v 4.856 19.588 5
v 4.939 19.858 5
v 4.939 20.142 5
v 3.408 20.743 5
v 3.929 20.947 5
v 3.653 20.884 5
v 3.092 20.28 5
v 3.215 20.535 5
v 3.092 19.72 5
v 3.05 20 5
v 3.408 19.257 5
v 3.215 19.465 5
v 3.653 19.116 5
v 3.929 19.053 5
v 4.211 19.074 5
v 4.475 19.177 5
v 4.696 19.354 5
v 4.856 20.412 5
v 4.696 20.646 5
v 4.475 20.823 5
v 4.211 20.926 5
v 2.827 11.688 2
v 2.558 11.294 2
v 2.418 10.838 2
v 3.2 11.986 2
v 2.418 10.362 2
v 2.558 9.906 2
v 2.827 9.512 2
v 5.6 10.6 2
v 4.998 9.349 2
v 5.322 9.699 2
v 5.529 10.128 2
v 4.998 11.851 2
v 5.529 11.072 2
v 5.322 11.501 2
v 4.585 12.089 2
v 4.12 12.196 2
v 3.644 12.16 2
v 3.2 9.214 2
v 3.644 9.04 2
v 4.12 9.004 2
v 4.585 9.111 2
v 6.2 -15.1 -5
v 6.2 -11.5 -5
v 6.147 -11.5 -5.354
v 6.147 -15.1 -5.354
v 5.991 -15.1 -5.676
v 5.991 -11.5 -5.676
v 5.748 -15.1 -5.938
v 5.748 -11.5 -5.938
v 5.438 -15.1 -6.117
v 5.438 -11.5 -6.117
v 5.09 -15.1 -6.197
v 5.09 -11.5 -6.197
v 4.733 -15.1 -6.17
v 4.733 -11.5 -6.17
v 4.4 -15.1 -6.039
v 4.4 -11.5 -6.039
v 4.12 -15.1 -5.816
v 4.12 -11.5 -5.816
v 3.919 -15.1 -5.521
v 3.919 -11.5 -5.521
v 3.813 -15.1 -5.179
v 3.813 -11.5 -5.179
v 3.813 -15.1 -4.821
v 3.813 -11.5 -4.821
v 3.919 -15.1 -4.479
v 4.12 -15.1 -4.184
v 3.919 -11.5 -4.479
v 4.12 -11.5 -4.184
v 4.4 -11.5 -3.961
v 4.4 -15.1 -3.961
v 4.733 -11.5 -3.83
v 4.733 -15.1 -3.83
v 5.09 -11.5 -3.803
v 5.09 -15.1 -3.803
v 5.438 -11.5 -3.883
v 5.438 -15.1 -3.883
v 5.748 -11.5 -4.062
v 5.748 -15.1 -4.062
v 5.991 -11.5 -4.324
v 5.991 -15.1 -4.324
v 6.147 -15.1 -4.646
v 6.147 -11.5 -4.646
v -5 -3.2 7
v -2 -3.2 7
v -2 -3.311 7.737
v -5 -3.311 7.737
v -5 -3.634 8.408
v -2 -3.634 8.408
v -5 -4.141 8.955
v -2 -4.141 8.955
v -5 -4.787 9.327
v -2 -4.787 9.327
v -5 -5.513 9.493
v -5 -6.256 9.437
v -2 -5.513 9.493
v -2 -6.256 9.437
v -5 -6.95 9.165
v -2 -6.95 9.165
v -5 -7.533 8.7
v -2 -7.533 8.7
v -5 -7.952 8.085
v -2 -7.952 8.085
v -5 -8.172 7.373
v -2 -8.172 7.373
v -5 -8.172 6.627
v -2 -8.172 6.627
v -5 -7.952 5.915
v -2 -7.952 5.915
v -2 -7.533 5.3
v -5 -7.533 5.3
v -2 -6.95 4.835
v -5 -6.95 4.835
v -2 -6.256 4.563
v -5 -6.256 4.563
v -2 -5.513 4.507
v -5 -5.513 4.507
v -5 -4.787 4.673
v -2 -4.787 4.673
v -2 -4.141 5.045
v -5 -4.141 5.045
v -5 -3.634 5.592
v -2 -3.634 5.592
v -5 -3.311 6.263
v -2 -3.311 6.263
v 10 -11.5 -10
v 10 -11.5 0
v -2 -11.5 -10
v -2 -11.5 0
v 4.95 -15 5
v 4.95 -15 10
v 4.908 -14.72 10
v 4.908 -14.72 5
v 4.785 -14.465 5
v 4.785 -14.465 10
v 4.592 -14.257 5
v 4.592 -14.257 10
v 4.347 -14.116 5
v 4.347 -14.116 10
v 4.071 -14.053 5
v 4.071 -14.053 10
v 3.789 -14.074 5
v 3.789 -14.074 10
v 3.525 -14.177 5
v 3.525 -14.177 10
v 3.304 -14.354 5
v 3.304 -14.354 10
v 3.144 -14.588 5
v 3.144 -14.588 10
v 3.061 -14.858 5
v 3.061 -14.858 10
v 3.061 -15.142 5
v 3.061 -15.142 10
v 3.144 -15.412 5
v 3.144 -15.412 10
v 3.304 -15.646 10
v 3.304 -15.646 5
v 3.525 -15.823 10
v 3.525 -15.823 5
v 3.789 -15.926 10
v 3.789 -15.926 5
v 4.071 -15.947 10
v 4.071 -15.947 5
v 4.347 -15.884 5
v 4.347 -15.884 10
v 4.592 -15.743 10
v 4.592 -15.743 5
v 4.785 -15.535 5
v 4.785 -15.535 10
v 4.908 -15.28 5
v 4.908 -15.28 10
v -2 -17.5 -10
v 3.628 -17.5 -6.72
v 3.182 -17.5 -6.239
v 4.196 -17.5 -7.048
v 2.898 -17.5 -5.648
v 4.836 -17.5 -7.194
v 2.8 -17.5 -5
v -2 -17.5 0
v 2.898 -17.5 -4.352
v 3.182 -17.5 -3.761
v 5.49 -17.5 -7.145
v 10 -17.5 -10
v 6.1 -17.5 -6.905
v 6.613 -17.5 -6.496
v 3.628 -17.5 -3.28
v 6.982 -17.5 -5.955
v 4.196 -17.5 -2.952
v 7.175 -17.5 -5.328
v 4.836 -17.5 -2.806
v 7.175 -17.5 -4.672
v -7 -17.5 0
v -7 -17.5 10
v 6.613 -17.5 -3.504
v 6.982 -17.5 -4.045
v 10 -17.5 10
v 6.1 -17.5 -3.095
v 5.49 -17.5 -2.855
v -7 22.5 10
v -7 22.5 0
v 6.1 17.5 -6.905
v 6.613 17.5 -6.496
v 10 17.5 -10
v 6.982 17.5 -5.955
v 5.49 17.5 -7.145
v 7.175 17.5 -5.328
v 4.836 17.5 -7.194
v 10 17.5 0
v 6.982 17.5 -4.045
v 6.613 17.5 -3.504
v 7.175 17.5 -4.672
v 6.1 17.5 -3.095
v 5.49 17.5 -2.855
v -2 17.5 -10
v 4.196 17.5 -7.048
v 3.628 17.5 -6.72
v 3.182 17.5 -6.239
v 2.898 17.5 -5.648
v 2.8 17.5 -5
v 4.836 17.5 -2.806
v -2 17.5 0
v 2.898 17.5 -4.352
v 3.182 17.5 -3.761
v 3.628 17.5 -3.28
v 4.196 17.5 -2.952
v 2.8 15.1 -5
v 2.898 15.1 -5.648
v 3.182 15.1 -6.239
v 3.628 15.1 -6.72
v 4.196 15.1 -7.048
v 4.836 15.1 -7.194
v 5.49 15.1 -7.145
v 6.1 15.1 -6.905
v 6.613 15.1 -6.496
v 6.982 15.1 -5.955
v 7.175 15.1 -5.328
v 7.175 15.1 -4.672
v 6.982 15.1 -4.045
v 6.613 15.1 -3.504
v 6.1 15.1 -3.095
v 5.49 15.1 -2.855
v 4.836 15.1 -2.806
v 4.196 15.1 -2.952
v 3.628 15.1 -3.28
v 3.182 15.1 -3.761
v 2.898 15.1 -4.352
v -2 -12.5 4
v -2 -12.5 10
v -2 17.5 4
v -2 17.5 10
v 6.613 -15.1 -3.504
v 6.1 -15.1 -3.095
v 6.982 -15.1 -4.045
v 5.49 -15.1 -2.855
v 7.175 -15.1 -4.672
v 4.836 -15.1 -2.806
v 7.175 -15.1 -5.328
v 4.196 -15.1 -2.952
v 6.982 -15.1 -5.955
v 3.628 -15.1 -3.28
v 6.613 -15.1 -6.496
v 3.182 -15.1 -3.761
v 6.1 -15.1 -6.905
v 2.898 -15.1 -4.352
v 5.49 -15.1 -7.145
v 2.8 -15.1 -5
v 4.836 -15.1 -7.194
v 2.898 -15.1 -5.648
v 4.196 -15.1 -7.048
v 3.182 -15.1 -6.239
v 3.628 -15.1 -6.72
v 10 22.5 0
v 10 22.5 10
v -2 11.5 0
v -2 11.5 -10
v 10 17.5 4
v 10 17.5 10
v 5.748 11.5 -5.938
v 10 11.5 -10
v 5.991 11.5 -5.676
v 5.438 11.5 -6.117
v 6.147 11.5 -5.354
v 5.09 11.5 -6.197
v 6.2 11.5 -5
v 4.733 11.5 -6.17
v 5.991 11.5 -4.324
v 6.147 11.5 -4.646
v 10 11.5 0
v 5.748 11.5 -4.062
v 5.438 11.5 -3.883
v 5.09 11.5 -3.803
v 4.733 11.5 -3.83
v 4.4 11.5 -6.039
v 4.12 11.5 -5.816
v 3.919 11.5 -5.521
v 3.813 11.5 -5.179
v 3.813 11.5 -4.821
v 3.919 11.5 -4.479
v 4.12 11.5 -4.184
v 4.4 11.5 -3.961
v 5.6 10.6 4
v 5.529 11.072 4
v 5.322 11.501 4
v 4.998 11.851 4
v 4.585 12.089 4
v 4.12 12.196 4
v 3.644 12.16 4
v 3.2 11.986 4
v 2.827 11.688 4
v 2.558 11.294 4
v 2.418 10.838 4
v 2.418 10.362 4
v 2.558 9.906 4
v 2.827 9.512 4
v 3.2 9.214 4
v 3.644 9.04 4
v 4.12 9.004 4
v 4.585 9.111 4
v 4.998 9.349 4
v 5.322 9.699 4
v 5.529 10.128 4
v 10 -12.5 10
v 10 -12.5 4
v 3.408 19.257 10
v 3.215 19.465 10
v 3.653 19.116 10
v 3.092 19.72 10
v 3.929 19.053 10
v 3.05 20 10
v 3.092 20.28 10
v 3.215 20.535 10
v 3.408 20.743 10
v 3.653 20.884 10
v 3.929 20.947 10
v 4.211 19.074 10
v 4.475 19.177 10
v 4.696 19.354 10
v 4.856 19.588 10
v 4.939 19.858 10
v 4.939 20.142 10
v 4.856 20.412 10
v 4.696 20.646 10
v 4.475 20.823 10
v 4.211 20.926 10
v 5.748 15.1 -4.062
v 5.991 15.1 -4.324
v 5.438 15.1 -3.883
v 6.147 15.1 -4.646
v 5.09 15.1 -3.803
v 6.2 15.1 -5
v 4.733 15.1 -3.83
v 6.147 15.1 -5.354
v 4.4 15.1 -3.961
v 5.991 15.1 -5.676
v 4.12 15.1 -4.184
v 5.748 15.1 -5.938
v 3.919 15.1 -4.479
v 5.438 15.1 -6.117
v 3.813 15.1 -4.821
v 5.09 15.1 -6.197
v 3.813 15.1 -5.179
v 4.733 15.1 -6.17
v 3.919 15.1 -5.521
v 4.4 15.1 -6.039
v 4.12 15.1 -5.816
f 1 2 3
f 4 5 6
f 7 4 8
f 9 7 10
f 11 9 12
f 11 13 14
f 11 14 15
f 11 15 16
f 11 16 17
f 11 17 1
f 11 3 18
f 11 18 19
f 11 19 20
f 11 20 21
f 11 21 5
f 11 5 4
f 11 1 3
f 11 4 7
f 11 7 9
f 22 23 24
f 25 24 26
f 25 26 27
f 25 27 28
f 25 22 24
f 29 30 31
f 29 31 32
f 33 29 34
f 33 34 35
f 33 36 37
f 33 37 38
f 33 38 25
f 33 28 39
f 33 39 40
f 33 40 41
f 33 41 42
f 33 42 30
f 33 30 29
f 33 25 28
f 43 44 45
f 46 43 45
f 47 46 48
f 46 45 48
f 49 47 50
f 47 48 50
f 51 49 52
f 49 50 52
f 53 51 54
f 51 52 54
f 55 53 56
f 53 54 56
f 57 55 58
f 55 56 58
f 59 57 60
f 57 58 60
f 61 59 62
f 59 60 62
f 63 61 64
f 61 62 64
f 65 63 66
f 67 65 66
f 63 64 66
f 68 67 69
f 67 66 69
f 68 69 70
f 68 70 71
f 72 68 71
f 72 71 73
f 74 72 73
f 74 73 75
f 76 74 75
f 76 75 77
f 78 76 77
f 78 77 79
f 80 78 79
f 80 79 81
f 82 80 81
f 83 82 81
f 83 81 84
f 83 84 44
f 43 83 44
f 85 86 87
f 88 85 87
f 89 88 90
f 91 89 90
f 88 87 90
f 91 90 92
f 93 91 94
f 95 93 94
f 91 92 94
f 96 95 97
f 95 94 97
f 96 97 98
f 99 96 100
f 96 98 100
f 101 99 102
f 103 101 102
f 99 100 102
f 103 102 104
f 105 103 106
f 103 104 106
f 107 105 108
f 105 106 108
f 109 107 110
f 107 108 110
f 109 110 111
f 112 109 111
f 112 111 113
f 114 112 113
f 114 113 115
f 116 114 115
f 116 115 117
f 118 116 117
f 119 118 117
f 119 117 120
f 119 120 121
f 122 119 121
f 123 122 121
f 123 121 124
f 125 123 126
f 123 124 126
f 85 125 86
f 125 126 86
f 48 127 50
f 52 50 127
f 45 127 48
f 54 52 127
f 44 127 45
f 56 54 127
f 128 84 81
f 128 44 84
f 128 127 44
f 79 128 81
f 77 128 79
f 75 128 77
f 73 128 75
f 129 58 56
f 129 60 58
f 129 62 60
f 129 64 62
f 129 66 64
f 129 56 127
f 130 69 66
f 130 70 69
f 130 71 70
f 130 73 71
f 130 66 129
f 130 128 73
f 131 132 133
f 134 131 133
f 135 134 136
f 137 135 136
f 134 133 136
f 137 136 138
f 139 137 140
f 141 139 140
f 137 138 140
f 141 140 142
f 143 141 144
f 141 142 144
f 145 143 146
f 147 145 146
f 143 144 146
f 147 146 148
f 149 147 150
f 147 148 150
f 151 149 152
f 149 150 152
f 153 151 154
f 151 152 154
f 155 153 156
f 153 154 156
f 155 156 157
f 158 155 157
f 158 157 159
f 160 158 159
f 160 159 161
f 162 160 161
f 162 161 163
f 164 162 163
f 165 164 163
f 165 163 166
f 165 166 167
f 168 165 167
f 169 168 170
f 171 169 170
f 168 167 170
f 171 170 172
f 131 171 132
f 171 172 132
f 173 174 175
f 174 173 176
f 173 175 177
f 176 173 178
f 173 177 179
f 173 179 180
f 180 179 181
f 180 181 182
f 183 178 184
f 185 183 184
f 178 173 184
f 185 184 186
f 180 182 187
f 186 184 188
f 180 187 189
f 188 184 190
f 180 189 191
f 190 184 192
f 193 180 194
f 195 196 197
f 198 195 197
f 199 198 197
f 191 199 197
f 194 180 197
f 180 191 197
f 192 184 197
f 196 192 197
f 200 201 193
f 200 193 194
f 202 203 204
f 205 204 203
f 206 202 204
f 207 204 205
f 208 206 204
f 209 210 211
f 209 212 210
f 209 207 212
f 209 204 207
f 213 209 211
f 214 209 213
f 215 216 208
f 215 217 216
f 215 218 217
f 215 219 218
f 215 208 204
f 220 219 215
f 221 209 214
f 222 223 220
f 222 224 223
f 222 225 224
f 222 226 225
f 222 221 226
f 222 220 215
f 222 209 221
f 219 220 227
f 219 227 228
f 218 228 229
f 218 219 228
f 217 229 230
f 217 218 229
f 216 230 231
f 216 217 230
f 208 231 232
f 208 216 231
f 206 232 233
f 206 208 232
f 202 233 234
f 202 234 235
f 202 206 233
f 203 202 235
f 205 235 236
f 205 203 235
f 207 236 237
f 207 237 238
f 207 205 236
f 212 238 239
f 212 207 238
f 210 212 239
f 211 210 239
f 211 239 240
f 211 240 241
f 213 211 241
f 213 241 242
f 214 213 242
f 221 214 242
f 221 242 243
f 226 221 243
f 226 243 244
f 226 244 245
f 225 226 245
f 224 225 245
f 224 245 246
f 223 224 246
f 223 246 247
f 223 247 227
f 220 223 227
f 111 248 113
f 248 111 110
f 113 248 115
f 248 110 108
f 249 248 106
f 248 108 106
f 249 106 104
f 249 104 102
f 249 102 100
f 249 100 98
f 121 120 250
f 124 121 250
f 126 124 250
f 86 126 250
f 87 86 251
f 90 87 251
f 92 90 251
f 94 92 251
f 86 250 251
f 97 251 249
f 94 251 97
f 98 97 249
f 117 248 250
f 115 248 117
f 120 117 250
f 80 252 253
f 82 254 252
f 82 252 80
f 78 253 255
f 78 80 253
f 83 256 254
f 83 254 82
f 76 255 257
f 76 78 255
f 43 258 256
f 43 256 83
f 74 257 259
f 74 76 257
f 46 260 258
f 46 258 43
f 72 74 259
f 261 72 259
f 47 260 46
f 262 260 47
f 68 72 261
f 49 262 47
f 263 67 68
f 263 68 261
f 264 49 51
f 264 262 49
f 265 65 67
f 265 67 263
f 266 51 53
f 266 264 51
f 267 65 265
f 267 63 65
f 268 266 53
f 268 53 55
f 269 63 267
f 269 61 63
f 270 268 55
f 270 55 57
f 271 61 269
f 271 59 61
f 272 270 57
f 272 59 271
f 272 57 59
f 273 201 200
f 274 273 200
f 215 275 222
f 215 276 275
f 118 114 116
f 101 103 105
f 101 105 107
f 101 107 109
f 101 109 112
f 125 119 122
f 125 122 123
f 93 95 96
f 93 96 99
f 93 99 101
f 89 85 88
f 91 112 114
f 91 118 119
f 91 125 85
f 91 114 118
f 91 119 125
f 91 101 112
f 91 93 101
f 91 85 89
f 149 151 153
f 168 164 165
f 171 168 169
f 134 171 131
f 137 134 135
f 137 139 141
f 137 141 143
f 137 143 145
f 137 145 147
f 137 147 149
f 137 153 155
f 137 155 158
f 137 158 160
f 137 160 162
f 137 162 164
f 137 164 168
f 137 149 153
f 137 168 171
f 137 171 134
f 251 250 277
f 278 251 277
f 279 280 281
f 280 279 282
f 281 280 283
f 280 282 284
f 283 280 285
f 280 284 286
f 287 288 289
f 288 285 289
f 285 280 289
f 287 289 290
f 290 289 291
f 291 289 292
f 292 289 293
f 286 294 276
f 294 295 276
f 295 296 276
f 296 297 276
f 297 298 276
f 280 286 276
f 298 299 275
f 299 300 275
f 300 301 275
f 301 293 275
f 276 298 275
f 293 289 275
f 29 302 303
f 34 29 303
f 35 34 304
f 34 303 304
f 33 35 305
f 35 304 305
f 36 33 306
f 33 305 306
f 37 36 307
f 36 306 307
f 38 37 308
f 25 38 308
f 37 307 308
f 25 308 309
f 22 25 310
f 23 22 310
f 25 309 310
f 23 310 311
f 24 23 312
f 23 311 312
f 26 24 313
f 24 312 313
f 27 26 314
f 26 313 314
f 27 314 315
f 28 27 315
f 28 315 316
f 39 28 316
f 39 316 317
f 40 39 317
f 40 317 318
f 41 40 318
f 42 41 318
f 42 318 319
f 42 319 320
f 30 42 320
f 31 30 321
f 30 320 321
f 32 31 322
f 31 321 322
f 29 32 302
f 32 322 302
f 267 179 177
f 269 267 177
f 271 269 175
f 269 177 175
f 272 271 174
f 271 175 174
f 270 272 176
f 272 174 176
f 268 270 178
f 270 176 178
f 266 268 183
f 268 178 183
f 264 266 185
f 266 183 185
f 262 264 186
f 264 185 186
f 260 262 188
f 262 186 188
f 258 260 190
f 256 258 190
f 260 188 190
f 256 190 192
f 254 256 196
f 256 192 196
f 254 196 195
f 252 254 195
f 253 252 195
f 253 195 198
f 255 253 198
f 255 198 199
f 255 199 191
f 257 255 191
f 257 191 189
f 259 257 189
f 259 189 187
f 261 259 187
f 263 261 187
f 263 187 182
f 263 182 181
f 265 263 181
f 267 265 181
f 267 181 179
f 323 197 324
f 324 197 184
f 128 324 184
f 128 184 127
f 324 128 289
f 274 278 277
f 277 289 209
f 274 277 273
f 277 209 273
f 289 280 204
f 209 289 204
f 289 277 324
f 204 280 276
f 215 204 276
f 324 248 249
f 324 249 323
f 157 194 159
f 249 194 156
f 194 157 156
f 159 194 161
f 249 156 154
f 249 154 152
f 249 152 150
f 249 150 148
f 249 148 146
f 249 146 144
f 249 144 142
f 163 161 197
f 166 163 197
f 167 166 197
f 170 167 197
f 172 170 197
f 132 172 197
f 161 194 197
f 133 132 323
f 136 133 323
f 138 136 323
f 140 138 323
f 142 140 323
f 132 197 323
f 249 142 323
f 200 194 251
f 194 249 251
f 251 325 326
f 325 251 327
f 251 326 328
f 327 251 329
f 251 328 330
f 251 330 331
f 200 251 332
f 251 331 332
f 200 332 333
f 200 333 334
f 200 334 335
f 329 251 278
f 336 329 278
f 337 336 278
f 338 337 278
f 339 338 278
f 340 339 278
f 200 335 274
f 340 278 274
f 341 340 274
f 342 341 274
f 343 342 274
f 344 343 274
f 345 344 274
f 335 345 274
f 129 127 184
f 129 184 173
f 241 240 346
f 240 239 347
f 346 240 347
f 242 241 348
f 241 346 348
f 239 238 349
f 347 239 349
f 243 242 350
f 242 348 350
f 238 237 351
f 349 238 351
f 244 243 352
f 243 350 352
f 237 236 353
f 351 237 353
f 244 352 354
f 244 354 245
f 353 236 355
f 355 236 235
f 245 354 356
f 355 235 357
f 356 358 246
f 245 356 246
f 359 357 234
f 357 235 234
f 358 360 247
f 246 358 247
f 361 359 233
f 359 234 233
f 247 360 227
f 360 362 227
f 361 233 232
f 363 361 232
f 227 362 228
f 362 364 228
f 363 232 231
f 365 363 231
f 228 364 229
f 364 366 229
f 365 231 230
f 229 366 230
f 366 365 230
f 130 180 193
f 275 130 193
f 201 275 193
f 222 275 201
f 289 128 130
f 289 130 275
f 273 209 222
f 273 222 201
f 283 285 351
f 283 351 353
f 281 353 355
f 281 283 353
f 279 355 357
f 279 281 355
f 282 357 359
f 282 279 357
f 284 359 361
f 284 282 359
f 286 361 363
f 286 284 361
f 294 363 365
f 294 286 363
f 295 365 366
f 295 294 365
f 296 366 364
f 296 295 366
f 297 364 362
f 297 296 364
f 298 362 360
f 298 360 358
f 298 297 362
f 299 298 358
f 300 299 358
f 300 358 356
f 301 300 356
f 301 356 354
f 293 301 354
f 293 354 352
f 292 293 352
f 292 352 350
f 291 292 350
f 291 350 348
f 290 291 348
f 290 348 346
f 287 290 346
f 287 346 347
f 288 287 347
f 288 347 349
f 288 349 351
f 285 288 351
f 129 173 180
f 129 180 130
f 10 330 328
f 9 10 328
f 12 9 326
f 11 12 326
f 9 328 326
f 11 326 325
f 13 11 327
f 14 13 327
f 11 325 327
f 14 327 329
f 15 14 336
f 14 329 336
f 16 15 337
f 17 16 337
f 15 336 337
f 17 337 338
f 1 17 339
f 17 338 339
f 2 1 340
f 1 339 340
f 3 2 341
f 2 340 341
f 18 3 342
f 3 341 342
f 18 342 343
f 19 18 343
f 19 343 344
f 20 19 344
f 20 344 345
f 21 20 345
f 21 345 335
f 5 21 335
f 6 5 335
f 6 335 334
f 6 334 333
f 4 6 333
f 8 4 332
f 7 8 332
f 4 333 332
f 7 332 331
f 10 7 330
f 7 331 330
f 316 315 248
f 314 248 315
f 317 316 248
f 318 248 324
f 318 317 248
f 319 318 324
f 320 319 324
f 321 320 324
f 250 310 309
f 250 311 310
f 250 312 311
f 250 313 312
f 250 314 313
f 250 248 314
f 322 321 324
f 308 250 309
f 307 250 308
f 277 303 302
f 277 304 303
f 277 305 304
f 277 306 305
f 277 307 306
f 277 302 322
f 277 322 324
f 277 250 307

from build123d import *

# Parameters (mm, degrees)
ESQUISSE1_W                                       = 12
ESQUISSE1_H                                       = 40
BOSS_EXTRU_1_DEPTH                                = 4
ESQUISSE2_W                                       = 12
ESQUISSE2_H                                       = 6
BOSS_EXTRU_2_DEPTH                                = 10
ESQUISSE3_R                                       = 1.6
ENL_V_MAT_EXTRU_1_DEPTH                           = 2
ESQUISSE4_W                                       = 12
ESQUISSE4_H                                       = 5
BOSS_EXTRU_3_DEPTH                                = 6
ESQUISSE5_R                                       = 0.95
ENL_V_MAT_EXTRU_2_DEPTH                           = 5
ESQUISSE6_W                                       = 10
ESQUISSE6_H                                       = 40
BOSS_EXTRU_4_DEPTH                                = 5
ESQUISSE7_R                                       = 2.5
ENL_V_MAT_EXTRU_3_DEPTH                           = 3
CHAMBRAGE_POUR_VIS_SIX_PANS_CREUX_M21_D           = 2.4
CHAMBRAGE_POUR_VIS_SIX_PANS_CREUX_M21_DEPTH       = 6
CHAMBRAGE_POUR_VIS_SIX_PANS_CREUX_M21_CBORE_D     = 4.4
CHAMBRAGE_POUR_VIS_SIX_PANS_CREUX_M21_CBORE_DEPTH = 2.4


with BuildPart() as part:
    # Esquisse1 → Boss.-Extru.1 (new body)
    with BuildSketch(Plane.XY):
        with Locations((4, 2.5)):
            Rectangle(ESQUISSE1_W, ESQUISSE1_H)
    extrude(amount=BOSS_EXTRU_1_DEPTH)

    # Esquisse2 → Boss.-Extru.2 (add)
    with BuildSketch(Plane(origin=(0, 0, 0), x_dir=(-1, 0, 0), z_dir=(0, 0, -1))):
        with Locations((-4, -14.5)):
            Rectangle(ESQUISSE2_W, ESQUISSE2_H)
    boss_extru_2 = extrude(amount=BOSS_EXTRU_2_DEPTH)

    # Symétrie1: Boss.-Extru.2 across plane
    add(boss_extru_2.mirror(Plane.ZX))

    # Esquisse3 → Enlèv. mat.-Extru.1 (cut)
    with BuildSketch(Plane.XY.offset(4)):
        with Locations((4, 10.6)):
            Circle(ESQUISSE3_R)
    extrude(amount=-ENL_V_MAT_EXTRU_1_DEPTH, mode=Mode.SUBTRACT)

    # Esquisse4 → Boss.-Extru.3 (add)
    with BuildSketch(Plane.XY.offset(4)):
        with Locations((4, 20)):
            Rectangle(ESQUISSE4_W, ESQUISSE4_H)
        with Locations((4, -15)):
            Rectangle(ESQUISSE4_W, ESQUISSE4_H)
    extrude(amount=BOSS_EXTRU_3_DEPTH)

    # Esquisse5 → Enlèv. mat.-Extru.2 (cut)
    with BuildSketch(Plane.XY.offset(10)):
        with Locations((4, -15)):
            Circle(ESQUISSE5_R)
        with Locations(Location((4, 20, 0), (0, 0, 180))):
            Circle(ESQUISSE5_R)
    extrude(amount=-ENL_V_MAT_EXTRU_2_DEPTH, mode=Mode.SUBTRACT)

    # Esquisse6 → Boss.-Extru.4 (add)
    with BuildSketch(Plane.ZY.offset(2)):
        with Locations((5, 2.5)):
            Rectangle(ESQUISSE6_W, ESQUISSE6_H)
    extrude(amount=BOSS_EXTRU_4_DEPTH)

    # Esquisse7 → Enlèv. mat.-Extru.3 (cut)
    with BuildSketch(Plane(origin=(-2, 0, 0), x_dir=(0, 0, -1), z_dir=(1, 0, 0))):
        with Locations(Location((-7, -5.7, 0), (0, 0, 90))):
            Circle(ESQUISSE7_R)
    extrude(amount=-ENL_V_MAT_EXTRU_3_DEPTH, mode=Mode.SUBTRACT)

    # Chambrage pour vis à six pans creux M21
    with Locations(Plane(origin=(0, -17.5, 0), x_dir=(-1, 0, 0), z_dir=(0, -1, 0))):
        with Locations((-5, 5)):
            chambrage_pour_vis_six_pans_creux_m21 = CounterBoreHole(CHAMBRAGE_POUR_VIS_SIX_PANS_CREUX_M21_D / 2, CHAMBRAGE_POUR_VIS_SIX_PANS_CREUX_M21_CBORE_D / 2, CHAMBRAGE_POUR_VIS_SIX_PANS_CREUX_M21_CBORE_DEPTH, depth=CHAMBRAGE_POUR_VIS_SIX_PANS_CREUX_M21_DEPTH)

    # Symétrie2: Chambrage pour vis à six pans creux M21 across plane
    add(chambrage_pour_vis_six_pans_creux_m21.mirror(Plane.ZX), mode=Mode.SUBTRACT)


solid = part.part
